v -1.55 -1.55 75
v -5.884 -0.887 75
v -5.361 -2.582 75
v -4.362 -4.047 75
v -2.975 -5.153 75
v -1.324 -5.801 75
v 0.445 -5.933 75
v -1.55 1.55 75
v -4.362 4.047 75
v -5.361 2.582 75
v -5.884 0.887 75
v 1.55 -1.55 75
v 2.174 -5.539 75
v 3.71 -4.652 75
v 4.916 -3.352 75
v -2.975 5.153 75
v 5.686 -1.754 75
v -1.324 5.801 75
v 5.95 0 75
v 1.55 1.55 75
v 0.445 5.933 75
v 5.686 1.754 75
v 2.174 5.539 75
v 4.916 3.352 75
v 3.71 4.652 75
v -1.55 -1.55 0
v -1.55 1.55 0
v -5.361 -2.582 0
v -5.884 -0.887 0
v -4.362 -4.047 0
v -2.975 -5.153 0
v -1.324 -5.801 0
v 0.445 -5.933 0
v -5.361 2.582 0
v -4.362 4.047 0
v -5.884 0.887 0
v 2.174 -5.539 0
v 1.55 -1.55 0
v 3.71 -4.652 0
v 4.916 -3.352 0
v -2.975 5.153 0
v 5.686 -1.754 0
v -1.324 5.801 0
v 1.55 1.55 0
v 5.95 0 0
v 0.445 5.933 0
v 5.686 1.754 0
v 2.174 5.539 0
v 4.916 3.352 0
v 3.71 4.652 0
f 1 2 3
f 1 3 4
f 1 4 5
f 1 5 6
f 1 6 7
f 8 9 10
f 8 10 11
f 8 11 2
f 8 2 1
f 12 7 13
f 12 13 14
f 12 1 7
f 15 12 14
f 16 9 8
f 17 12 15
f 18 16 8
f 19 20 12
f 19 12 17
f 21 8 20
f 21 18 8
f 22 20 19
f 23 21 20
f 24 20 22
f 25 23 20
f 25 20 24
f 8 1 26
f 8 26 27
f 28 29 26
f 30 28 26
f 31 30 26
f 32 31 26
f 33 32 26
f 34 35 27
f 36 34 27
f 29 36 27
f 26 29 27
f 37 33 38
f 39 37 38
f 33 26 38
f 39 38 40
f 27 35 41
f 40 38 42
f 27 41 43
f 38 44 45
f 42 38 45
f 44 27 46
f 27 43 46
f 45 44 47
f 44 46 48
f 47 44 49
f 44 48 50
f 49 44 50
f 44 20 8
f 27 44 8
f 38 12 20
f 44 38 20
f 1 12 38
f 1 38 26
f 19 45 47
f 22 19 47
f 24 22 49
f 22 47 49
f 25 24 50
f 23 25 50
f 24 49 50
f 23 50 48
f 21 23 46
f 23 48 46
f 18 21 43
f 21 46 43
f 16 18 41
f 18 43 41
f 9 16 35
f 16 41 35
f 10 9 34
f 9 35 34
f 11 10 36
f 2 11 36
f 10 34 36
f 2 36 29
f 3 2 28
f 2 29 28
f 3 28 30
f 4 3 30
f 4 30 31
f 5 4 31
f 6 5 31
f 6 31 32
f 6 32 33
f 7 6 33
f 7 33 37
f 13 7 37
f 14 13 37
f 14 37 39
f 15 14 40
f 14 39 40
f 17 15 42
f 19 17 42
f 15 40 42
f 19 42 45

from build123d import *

# Parameters (mm, degrees)
ESQUISSE1_R             = 5.95
BOSS_EXTRU_1_DEPTH      = 75
ESQUISSE2_W             = 3.1
ESQUISSE2_H             = 3.1
ENL_V_MAT_EXTRU_1_DEPTH = 76.470557173


with BuildPart() as part:
    # Esquisse1 → Boss.-Extru.1 (new body)
    with BuildSketch(Plane.XY):
        Circle(ESQUISSE1_R)
    extrude(amount=BOSS_EXTRU_1_DEPTH)

    # Esquisse2 → Enlèv. mat.-Extru.1 (cut, through all)
    with BuildSketch(Plane(origin=(0, 0, 0), x_dir=(-1, 0, 0), z_dir=(0, 0, -1))):
        Rectangle(ESQUISSE2_W, ESQUISSE2_H)
    extrude(amount=-ENL_V_MAT_EXTRU_1_DEPTH, mode=Mode.SUBTRACT)


solid = part.part
